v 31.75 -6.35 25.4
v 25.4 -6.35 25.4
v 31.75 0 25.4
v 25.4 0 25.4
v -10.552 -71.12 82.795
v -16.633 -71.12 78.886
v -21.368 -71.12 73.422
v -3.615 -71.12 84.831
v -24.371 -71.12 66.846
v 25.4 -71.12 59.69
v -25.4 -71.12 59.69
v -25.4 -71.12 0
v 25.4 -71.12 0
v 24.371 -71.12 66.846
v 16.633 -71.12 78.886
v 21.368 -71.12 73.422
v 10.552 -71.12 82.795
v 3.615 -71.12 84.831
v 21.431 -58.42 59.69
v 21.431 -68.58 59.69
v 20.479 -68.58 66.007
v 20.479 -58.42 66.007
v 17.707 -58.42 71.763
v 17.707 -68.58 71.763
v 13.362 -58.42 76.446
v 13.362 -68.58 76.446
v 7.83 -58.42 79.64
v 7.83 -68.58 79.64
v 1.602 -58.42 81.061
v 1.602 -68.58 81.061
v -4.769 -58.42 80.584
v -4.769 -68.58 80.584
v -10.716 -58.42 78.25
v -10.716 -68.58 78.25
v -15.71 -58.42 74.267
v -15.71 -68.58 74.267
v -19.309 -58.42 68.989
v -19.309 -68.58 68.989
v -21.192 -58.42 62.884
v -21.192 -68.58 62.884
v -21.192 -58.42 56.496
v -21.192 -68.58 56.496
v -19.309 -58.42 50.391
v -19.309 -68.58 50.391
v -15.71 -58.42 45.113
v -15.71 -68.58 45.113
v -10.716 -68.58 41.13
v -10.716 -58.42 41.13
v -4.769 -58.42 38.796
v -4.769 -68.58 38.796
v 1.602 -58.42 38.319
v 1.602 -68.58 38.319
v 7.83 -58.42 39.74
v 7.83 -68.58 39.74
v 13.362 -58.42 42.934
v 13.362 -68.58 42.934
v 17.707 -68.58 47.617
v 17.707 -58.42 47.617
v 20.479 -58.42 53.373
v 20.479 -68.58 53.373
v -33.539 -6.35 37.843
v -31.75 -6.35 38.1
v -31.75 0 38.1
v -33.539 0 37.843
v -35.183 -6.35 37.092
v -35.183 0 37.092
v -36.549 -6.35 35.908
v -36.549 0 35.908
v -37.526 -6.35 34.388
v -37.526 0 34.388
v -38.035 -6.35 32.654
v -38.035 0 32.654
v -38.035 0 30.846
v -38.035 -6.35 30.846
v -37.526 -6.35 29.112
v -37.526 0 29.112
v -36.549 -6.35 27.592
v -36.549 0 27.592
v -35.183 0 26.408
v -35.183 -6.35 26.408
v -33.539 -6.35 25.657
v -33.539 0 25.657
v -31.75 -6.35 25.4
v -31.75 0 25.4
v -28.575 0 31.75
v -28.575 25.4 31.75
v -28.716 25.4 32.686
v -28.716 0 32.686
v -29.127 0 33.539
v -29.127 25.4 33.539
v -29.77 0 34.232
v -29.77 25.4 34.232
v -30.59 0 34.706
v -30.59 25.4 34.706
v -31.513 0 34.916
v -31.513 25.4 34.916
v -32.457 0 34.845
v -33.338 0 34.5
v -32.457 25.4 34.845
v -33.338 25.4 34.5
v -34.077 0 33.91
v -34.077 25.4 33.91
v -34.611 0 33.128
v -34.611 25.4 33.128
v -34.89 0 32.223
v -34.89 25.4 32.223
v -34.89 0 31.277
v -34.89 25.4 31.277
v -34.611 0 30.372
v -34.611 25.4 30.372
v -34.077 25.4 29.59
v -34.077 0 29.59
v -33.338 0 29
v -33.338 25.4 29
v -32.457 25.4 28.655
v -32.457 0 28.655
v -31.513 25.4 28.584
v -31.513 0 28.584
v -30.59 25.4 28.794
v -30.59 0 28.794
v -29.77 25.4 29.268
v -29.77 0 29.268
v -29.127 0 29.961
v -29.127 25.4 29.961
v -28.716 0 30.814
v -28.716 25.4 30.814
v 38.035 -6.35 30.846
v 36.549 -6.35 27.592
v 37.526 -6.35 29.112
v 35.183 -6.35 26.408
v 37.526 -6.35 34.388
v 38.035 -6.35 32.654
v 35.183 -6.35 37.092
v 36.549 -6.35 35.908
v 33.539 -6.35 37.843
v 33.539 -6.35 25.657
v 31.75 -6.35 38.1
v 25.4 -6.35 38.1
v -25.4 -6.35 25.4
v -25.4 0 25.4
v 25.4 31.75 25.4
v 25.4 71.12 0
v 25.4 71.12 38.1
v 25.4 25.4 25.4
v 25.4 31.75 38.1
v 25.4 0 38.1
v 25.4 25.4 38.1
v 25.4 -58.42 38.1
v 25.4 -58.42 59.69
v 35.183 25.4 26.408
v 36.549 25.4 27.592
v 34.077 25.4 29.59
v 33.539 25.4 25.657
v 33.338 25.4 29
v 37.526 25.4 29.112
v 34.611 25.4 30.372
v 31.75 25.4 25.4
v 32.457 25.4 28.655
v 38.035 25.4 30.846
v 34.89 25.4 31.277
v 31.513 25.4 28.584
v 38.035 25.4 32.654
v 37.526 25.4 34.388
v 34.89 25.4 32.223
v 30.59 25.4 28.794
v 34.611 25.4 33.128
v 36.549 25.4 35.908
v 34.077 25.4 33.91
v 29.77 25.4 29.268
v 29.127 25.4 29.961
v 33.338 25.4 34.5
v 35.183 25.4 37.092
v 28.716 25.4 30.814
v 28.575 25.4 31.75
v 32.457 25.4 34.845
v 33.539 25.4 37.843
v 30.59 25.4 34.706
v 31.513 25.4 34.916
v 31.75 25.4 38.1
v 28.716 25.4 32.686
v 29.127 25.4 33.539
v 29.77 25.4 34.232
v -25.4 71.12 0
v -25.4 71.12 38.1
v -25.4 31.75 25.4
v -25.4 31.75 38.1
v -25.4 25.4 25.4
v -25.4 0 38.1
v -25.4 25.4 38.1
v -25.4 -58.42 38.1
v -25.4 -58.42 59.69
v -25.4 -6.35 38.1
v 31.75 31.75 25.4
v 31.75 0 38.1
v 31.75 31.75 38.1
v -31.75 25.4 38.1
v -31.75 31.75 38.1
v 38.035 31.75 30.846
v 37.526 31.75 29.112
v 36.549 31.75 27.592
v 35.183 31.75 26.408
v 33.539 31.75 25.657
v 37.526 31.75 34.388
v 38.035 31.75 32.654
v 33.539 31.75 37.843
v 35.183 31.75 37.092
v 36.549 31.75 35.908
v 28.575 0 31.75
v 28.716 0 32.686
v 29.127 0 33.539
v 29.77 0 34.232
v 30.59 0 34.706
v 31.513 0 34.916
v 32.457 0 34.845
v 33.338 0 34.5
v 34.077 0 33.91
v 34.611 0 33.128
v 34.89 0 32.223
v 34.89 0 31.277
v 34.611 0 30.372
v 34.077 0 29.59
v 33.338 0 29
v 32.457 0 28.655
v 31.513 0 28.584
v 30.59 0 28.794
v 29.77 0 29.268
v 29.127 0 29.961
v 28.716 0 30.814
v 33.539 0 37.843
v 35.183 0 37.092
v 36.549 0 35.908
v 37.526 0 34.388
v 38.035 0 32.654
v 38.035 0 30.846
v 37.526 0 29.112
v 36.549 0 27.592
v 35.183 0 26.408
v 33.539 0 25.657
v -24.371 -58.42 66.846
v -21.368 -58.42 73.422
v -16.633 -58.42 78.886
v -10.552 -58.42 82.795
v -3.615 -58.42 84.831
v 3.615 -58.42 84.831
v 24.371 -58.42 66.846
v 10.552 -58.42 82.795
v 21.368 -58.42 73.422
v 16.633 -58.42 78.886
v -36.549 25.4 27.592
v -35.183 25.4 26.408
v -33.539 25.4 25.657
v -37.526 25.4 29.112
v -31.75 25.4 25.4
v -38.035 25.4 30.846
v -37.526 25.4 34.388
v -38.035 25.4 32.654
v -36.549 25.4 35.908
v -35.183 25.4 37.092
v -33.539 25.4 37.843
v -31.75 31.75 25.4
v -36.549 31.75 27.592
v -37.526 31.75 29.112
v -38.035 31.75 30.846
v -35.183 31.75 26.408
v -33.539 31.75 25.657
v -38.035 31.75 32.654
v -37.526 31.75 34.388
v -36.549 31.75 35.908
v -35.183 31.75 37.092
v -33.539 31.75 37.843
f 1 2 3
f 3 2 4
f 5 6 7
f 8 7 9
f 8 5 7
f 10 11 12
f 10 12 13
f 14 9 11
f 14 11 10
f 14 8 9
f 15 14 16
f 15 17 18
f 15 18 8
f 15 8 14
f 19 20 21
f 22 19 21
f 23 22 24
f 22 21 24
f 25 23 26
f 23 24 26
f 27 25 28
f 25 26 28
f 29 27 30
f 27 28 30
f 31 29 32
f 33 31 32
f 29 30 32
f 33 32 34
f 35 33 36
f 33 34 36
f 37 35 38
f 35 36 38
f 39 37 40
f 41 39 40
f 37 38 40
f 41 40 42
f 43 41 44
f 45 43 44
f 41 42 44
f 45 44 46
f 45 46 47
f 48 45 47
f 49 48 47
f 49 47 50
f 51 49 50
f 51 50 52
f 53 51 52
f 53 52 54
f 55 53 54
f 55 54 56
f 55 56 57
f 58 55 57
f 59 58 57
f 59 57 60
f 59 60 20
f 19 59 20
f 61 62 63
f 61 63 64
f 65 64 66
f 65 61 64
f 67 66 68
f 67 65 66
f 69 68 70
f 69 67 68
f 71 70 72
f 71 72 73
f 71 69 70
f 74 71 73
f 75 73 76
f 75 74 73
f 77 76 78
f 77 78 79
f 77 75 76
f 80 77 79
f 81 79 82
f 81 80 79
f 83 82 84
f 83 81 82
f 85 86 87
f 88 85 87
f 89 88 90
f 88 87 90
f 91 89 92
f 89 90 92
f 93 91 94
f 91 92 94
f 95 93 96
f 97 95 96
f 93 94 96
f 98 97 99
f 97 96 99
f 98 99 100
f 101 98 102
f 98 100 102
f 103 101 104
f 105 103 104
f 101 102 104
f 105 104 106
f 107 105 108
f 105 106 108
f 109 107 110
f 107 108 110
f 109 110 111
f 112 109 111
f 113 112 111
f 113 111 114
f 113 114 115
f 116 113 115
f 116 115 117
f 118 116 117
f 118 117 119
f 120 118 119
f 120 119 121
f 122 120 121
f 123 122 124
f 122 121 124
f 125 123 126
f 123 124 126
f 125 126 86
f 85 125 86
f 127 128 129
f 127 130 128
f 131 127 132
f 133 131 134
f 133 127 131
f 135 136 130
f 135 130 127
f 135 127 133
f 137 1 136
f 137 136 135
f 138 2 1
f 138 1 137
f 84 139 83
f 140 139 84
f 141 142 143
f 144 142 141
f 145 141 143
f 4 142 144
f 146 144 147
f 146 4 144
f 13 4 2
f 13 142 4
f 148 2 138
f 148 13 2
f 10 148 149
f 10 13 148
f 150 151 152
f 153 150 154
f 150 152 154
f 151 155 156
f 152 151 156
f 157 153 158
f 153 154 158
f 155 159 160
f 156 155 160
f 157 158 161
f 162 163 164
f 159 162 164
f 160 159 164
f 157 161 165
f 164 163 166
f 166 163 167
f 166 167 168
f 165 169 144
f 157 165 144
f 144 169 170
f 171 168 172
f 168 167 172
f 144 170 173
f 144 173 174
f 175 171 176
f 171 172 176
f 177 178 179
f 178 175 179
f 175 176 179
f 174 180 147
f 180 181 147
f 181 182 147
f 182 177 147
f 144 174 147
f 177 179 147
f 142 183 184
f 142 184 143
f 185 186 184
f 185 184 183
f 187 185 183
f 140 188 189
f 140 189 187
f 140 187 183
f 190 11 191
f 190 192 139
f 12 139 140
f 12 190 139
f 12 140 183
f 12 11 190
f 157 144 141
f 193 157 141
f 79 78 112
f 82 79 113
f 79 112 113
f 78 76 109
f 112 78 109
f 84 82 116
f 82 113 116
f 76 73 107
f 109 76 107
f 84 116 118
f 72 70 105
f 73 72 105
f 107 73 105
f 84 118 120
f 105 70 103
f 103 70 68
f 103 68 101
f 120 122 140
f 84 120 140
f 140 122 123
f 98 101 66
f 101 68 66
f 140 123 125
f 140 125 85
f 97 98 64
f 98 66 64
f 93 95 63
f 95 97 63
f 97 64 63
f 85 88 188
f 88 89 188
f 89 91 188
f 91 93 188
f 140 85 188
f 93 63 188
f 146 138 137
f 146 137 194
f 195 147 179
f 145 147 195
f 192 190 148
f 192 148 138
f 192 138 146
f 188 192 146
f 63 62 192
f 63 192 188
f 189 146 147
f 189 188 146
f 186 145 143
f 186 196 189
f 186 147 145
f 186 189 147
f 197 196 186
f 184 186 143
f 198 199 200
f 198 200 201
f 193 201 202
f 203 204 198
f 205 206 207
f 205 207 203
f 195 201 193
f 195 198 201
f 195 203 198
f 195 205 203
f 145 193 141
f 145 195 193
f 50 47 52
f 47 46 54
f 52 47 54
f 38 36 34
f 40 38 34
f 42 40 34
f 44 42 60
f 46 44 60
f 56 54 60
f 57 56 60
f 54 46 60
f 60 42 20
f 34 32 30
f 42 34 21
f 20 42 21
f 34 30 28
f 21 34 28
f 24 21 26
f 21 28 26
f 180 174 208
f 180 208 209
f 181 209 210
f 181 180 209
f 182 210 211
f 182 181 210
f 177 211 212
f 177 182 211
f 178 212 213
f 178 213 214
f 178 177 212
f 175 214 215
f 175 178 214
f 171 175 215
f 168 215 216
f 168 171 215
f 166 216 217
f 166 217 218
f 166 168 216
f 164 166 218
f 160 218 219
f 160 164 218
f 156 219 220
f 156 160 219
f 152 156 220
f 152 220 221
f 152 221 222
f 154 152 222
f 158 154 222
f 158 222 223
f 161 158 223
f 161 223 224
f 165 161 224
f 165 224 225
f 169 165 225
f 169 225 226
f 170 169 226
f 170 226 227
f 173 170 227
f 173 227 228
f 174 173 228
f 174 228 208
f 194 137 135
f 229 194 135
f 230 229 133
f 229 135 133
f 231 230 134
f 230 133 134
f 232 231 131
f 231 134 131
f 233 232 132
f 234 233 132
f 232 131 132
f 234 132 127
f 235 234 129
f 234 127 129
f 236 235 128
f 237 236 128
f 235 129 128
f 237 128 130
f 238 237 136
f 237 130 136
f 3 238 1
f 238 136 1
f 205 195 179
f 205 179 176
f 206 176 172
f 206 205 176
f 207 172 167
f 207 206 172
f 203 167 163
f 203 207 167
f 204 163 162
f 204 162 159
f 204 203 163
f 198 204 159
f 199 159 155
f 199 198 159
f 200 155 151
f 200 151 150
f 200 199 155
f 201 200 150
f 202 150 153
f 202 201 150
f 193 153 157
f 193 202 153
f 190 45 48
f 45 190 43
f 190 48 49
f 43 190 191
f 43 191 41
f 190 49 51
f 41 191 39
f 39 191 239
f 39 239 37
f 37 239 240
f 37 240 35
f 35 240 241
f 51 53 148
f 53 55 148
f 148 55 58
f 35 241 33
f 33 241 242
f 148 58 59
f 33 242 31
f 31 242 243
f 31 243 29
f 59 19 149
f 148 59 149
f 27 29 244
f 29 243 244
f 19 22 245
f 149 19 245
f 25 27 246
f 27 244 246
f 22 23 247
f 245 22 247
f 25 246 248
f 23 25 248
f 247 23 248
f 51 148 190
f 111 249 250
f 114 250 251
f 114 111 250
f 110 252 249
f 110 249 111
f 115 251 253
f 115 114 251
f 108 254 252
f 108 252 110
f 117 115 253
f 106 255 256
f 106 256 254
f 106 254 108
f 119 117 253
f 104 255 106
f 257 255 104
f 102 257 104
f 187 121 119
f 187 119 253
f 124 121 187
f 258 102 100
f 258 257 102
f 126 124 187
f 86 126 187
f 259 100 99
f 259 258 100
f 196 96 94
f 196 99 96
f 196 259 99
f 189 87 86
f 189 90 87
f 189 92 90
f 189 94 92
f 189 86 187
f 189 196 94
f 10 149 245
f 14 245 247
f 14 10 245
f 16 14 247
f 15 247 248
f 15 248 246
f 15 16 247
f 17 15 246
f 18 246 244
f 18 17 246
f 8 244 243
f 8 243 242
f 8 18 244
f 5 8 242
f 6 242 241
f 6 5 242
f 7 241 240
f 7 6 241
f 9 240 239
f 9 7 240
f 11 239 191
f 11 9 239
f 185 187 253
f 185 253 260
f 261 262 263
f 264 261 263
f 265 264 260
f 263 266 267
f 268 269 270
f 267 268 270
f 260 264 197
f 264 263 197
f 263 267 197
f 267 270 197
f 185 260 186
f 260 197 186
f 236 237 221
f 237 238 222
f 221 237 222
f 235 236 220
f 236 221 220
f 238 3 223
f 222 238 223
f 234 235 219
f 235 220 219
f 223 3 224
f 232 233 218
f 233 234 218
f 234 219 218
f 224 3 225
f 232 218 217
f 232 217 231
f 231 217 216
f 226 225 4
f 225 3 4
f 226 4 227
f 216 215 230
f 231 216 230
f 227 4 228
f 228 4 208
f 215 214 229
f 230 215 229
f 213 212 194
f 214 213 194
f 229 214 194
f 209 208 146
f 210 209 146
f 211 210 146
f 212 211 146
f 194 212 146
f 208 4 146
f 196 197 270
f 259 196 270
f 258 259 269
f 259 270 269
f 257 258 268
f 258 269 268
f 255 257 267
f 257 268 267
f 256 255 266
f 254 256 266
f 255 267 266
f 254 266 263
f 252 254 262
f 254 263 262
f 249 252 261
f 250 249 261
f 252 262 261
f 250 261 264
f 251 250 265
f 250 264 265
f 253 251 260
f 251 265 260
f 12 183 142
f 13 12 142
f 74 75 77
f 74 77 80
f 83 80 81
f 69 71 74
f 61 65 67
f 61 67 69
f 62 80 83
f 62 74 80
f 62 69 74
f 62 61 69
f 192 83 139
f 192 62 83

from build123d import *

# Parameters (mm, degrees)
SKETCH1_W            = 50.8
SKETCH1_H            = 142.24
BOSS_EXTRUDE1_DEPTH  = 38.1
SKETCH8_R            = 21.43125
BOSS_EXTRUDE2_DEPTH  = 2.54
SKETCH8_5_R          = 21.43125
BOSS_EXTRUDE9_DEPTH  = 12.7
SKETCH19_W           = 12.7
SKETCH19_H           = 6.35
BOSS_EXTRUDE10_DEPTH = 6.35
BOSS_EXTRUDE11_DEPTH = 6.35
SKETCH23_R           = 3.175
BOSS_EXTRUDE12_DEPTH = 25.4
MIRROR2_COPY_1_DEPTH = 6.35


with BuildPart() as part:
    # Sketch1 → Boss-Extrude1 (new body)
    with BuildSketch(Plane.XY):
        Rectangle(SKETCH1_W, SKETCH1_H)
    extrude(amount=BOSS_EXTRUDE1_DEPTH)



with BuildPart() as body_2:
    # Sketch8 → Boss-Extrude2 (new body)
    with BuildSketch(Plane.XZ.offset(71.12)):
        with BuildLine():
            Line((-25.4, 38.1), (25.4, 38.1))
            Line((25.4, 38.1), (25.4, 59.69))
            ThreePointArc((25.4, 59.69), (0, 85.09), (-25.4, 59.69))
            Line((-25.4, 59.69), (-25.4, 38.1))
        make_face()
        with Locations((0, 59.69)):
            Circle(SKETCH8_R, mode=Mode.SUBTRACT)
        with Locations((0, 59.69)):
            Circle(SKETCH8_R)
    extrude(amount=-BOSS_EXTRUDE2_DEPTH)


with BuildPart() as part_1:
    add(part.part)

    add(body_2.part)  # Boss-Extrude9 merges body 2
    # Sketch8<5> → Boss-Extrude9 (add)
    with BuildSketch(Plane.XZ.offset(71.12)):
        with BuildLine():
            Line((25.4, 38.1), (25.4, 59.69))
            ThreePointArc((25.4, 59.69), (0, 85.09), (-25.4, 59.69))
            Line((-25.4, 59.69), (-25.4, 38.1))
            Line((-25.4, 38.1), (25.4, 38.1))
        make_face()
        with Locations((0, 59.69)):
            Circle(SKETCH8_5_R, mode=Mode.SUBTRACT)
    extrude(amount=-BOSS_EXTRUDE9_DEPTH)

    # Sketch19 → Boss-Extrude10 (add)
    with BuildSketch(Plane.ZY.offset(25.4)):
        with Locations((31.75, 28.575)):
            Rectangle(SKETCH19_W, SKETCH19_H)
        with Locations((31.75, -3.175)):
            Rectangle(SKETCH19_W, SKETCH19_H)
    boss_extrude10 = extrude(amount=BOSS_EXTRUDE10_DEPTH)

    # Sketch20 → Boss-Extrude11 (add)
    with BuildSketch(Plane.XZ.offset(6.35)):
        with BuildLine():
            Line((-31.75, 25.4), (-31.75, 38.1))
            ThreePointArc((-31.75, 38.1), (-38.1, 31.75), (-31.75, 25.4))
        make_face()
    boss_extrude11 = extrude(amount=-BOSS_EXTRUDE11_DEPTH)

    # Mirror1: Boss-Extrude11 across plane
    add(boss_extrude11.mirror(Plane(origin=(0, 12.7, 0), x_dir=(0, 0, 1), z_dir=(0, -1, 0))))

    # Sketch23 → Boss-Extrude12 (add)
    with BuildSketch(Plane.XZ.offset(-25.4)):
        with Locations((-31.75, 31.75)):
            Circle(SKETCH23_R)
    boss_extrude12 = extrude(amount=BOSS_EXTRUDE12_DEPTH)

    # Mirror2: Boss-Extrude12, Boss-Extrude11, Boss-Extrude10 across plane
    add(boss_extrude12.mirror(Plane(origin=(0, 0, 0), x_dir=(0, 0, 1), z_dir=(1, 0, 0))))
    add(boss_extrude11.mirror(Plane(origin=(0, 0, 0), x_dir=(0, 0, 1), z_dir=(1, 0, 0))))
    add(boss_extrude10.mirror(Plane(origin=(0, 0, 0), x_dir=(0, 0, 1), z_dir=(1, 0, 0))))

    # Mirror2 copy 1 sketch → Mirror2 copy 1 (add)
    with BuildSketch(Plane(origin=(0, 31.75, 0), x_dir=(-1, 0, 0), z_dir=(0, 1, 0))):
        with BuildLine():
            Line((-31.75, 25.4), (-31.75, 38.1))
            ThreePointArc((-31.75, 38.1), (-38.1, 31.75), (-31.75, 25.4))
        make_face()
    extrude(amount=-MIRROR2_COPY_1_DEPTH)


solid = part_1.part
